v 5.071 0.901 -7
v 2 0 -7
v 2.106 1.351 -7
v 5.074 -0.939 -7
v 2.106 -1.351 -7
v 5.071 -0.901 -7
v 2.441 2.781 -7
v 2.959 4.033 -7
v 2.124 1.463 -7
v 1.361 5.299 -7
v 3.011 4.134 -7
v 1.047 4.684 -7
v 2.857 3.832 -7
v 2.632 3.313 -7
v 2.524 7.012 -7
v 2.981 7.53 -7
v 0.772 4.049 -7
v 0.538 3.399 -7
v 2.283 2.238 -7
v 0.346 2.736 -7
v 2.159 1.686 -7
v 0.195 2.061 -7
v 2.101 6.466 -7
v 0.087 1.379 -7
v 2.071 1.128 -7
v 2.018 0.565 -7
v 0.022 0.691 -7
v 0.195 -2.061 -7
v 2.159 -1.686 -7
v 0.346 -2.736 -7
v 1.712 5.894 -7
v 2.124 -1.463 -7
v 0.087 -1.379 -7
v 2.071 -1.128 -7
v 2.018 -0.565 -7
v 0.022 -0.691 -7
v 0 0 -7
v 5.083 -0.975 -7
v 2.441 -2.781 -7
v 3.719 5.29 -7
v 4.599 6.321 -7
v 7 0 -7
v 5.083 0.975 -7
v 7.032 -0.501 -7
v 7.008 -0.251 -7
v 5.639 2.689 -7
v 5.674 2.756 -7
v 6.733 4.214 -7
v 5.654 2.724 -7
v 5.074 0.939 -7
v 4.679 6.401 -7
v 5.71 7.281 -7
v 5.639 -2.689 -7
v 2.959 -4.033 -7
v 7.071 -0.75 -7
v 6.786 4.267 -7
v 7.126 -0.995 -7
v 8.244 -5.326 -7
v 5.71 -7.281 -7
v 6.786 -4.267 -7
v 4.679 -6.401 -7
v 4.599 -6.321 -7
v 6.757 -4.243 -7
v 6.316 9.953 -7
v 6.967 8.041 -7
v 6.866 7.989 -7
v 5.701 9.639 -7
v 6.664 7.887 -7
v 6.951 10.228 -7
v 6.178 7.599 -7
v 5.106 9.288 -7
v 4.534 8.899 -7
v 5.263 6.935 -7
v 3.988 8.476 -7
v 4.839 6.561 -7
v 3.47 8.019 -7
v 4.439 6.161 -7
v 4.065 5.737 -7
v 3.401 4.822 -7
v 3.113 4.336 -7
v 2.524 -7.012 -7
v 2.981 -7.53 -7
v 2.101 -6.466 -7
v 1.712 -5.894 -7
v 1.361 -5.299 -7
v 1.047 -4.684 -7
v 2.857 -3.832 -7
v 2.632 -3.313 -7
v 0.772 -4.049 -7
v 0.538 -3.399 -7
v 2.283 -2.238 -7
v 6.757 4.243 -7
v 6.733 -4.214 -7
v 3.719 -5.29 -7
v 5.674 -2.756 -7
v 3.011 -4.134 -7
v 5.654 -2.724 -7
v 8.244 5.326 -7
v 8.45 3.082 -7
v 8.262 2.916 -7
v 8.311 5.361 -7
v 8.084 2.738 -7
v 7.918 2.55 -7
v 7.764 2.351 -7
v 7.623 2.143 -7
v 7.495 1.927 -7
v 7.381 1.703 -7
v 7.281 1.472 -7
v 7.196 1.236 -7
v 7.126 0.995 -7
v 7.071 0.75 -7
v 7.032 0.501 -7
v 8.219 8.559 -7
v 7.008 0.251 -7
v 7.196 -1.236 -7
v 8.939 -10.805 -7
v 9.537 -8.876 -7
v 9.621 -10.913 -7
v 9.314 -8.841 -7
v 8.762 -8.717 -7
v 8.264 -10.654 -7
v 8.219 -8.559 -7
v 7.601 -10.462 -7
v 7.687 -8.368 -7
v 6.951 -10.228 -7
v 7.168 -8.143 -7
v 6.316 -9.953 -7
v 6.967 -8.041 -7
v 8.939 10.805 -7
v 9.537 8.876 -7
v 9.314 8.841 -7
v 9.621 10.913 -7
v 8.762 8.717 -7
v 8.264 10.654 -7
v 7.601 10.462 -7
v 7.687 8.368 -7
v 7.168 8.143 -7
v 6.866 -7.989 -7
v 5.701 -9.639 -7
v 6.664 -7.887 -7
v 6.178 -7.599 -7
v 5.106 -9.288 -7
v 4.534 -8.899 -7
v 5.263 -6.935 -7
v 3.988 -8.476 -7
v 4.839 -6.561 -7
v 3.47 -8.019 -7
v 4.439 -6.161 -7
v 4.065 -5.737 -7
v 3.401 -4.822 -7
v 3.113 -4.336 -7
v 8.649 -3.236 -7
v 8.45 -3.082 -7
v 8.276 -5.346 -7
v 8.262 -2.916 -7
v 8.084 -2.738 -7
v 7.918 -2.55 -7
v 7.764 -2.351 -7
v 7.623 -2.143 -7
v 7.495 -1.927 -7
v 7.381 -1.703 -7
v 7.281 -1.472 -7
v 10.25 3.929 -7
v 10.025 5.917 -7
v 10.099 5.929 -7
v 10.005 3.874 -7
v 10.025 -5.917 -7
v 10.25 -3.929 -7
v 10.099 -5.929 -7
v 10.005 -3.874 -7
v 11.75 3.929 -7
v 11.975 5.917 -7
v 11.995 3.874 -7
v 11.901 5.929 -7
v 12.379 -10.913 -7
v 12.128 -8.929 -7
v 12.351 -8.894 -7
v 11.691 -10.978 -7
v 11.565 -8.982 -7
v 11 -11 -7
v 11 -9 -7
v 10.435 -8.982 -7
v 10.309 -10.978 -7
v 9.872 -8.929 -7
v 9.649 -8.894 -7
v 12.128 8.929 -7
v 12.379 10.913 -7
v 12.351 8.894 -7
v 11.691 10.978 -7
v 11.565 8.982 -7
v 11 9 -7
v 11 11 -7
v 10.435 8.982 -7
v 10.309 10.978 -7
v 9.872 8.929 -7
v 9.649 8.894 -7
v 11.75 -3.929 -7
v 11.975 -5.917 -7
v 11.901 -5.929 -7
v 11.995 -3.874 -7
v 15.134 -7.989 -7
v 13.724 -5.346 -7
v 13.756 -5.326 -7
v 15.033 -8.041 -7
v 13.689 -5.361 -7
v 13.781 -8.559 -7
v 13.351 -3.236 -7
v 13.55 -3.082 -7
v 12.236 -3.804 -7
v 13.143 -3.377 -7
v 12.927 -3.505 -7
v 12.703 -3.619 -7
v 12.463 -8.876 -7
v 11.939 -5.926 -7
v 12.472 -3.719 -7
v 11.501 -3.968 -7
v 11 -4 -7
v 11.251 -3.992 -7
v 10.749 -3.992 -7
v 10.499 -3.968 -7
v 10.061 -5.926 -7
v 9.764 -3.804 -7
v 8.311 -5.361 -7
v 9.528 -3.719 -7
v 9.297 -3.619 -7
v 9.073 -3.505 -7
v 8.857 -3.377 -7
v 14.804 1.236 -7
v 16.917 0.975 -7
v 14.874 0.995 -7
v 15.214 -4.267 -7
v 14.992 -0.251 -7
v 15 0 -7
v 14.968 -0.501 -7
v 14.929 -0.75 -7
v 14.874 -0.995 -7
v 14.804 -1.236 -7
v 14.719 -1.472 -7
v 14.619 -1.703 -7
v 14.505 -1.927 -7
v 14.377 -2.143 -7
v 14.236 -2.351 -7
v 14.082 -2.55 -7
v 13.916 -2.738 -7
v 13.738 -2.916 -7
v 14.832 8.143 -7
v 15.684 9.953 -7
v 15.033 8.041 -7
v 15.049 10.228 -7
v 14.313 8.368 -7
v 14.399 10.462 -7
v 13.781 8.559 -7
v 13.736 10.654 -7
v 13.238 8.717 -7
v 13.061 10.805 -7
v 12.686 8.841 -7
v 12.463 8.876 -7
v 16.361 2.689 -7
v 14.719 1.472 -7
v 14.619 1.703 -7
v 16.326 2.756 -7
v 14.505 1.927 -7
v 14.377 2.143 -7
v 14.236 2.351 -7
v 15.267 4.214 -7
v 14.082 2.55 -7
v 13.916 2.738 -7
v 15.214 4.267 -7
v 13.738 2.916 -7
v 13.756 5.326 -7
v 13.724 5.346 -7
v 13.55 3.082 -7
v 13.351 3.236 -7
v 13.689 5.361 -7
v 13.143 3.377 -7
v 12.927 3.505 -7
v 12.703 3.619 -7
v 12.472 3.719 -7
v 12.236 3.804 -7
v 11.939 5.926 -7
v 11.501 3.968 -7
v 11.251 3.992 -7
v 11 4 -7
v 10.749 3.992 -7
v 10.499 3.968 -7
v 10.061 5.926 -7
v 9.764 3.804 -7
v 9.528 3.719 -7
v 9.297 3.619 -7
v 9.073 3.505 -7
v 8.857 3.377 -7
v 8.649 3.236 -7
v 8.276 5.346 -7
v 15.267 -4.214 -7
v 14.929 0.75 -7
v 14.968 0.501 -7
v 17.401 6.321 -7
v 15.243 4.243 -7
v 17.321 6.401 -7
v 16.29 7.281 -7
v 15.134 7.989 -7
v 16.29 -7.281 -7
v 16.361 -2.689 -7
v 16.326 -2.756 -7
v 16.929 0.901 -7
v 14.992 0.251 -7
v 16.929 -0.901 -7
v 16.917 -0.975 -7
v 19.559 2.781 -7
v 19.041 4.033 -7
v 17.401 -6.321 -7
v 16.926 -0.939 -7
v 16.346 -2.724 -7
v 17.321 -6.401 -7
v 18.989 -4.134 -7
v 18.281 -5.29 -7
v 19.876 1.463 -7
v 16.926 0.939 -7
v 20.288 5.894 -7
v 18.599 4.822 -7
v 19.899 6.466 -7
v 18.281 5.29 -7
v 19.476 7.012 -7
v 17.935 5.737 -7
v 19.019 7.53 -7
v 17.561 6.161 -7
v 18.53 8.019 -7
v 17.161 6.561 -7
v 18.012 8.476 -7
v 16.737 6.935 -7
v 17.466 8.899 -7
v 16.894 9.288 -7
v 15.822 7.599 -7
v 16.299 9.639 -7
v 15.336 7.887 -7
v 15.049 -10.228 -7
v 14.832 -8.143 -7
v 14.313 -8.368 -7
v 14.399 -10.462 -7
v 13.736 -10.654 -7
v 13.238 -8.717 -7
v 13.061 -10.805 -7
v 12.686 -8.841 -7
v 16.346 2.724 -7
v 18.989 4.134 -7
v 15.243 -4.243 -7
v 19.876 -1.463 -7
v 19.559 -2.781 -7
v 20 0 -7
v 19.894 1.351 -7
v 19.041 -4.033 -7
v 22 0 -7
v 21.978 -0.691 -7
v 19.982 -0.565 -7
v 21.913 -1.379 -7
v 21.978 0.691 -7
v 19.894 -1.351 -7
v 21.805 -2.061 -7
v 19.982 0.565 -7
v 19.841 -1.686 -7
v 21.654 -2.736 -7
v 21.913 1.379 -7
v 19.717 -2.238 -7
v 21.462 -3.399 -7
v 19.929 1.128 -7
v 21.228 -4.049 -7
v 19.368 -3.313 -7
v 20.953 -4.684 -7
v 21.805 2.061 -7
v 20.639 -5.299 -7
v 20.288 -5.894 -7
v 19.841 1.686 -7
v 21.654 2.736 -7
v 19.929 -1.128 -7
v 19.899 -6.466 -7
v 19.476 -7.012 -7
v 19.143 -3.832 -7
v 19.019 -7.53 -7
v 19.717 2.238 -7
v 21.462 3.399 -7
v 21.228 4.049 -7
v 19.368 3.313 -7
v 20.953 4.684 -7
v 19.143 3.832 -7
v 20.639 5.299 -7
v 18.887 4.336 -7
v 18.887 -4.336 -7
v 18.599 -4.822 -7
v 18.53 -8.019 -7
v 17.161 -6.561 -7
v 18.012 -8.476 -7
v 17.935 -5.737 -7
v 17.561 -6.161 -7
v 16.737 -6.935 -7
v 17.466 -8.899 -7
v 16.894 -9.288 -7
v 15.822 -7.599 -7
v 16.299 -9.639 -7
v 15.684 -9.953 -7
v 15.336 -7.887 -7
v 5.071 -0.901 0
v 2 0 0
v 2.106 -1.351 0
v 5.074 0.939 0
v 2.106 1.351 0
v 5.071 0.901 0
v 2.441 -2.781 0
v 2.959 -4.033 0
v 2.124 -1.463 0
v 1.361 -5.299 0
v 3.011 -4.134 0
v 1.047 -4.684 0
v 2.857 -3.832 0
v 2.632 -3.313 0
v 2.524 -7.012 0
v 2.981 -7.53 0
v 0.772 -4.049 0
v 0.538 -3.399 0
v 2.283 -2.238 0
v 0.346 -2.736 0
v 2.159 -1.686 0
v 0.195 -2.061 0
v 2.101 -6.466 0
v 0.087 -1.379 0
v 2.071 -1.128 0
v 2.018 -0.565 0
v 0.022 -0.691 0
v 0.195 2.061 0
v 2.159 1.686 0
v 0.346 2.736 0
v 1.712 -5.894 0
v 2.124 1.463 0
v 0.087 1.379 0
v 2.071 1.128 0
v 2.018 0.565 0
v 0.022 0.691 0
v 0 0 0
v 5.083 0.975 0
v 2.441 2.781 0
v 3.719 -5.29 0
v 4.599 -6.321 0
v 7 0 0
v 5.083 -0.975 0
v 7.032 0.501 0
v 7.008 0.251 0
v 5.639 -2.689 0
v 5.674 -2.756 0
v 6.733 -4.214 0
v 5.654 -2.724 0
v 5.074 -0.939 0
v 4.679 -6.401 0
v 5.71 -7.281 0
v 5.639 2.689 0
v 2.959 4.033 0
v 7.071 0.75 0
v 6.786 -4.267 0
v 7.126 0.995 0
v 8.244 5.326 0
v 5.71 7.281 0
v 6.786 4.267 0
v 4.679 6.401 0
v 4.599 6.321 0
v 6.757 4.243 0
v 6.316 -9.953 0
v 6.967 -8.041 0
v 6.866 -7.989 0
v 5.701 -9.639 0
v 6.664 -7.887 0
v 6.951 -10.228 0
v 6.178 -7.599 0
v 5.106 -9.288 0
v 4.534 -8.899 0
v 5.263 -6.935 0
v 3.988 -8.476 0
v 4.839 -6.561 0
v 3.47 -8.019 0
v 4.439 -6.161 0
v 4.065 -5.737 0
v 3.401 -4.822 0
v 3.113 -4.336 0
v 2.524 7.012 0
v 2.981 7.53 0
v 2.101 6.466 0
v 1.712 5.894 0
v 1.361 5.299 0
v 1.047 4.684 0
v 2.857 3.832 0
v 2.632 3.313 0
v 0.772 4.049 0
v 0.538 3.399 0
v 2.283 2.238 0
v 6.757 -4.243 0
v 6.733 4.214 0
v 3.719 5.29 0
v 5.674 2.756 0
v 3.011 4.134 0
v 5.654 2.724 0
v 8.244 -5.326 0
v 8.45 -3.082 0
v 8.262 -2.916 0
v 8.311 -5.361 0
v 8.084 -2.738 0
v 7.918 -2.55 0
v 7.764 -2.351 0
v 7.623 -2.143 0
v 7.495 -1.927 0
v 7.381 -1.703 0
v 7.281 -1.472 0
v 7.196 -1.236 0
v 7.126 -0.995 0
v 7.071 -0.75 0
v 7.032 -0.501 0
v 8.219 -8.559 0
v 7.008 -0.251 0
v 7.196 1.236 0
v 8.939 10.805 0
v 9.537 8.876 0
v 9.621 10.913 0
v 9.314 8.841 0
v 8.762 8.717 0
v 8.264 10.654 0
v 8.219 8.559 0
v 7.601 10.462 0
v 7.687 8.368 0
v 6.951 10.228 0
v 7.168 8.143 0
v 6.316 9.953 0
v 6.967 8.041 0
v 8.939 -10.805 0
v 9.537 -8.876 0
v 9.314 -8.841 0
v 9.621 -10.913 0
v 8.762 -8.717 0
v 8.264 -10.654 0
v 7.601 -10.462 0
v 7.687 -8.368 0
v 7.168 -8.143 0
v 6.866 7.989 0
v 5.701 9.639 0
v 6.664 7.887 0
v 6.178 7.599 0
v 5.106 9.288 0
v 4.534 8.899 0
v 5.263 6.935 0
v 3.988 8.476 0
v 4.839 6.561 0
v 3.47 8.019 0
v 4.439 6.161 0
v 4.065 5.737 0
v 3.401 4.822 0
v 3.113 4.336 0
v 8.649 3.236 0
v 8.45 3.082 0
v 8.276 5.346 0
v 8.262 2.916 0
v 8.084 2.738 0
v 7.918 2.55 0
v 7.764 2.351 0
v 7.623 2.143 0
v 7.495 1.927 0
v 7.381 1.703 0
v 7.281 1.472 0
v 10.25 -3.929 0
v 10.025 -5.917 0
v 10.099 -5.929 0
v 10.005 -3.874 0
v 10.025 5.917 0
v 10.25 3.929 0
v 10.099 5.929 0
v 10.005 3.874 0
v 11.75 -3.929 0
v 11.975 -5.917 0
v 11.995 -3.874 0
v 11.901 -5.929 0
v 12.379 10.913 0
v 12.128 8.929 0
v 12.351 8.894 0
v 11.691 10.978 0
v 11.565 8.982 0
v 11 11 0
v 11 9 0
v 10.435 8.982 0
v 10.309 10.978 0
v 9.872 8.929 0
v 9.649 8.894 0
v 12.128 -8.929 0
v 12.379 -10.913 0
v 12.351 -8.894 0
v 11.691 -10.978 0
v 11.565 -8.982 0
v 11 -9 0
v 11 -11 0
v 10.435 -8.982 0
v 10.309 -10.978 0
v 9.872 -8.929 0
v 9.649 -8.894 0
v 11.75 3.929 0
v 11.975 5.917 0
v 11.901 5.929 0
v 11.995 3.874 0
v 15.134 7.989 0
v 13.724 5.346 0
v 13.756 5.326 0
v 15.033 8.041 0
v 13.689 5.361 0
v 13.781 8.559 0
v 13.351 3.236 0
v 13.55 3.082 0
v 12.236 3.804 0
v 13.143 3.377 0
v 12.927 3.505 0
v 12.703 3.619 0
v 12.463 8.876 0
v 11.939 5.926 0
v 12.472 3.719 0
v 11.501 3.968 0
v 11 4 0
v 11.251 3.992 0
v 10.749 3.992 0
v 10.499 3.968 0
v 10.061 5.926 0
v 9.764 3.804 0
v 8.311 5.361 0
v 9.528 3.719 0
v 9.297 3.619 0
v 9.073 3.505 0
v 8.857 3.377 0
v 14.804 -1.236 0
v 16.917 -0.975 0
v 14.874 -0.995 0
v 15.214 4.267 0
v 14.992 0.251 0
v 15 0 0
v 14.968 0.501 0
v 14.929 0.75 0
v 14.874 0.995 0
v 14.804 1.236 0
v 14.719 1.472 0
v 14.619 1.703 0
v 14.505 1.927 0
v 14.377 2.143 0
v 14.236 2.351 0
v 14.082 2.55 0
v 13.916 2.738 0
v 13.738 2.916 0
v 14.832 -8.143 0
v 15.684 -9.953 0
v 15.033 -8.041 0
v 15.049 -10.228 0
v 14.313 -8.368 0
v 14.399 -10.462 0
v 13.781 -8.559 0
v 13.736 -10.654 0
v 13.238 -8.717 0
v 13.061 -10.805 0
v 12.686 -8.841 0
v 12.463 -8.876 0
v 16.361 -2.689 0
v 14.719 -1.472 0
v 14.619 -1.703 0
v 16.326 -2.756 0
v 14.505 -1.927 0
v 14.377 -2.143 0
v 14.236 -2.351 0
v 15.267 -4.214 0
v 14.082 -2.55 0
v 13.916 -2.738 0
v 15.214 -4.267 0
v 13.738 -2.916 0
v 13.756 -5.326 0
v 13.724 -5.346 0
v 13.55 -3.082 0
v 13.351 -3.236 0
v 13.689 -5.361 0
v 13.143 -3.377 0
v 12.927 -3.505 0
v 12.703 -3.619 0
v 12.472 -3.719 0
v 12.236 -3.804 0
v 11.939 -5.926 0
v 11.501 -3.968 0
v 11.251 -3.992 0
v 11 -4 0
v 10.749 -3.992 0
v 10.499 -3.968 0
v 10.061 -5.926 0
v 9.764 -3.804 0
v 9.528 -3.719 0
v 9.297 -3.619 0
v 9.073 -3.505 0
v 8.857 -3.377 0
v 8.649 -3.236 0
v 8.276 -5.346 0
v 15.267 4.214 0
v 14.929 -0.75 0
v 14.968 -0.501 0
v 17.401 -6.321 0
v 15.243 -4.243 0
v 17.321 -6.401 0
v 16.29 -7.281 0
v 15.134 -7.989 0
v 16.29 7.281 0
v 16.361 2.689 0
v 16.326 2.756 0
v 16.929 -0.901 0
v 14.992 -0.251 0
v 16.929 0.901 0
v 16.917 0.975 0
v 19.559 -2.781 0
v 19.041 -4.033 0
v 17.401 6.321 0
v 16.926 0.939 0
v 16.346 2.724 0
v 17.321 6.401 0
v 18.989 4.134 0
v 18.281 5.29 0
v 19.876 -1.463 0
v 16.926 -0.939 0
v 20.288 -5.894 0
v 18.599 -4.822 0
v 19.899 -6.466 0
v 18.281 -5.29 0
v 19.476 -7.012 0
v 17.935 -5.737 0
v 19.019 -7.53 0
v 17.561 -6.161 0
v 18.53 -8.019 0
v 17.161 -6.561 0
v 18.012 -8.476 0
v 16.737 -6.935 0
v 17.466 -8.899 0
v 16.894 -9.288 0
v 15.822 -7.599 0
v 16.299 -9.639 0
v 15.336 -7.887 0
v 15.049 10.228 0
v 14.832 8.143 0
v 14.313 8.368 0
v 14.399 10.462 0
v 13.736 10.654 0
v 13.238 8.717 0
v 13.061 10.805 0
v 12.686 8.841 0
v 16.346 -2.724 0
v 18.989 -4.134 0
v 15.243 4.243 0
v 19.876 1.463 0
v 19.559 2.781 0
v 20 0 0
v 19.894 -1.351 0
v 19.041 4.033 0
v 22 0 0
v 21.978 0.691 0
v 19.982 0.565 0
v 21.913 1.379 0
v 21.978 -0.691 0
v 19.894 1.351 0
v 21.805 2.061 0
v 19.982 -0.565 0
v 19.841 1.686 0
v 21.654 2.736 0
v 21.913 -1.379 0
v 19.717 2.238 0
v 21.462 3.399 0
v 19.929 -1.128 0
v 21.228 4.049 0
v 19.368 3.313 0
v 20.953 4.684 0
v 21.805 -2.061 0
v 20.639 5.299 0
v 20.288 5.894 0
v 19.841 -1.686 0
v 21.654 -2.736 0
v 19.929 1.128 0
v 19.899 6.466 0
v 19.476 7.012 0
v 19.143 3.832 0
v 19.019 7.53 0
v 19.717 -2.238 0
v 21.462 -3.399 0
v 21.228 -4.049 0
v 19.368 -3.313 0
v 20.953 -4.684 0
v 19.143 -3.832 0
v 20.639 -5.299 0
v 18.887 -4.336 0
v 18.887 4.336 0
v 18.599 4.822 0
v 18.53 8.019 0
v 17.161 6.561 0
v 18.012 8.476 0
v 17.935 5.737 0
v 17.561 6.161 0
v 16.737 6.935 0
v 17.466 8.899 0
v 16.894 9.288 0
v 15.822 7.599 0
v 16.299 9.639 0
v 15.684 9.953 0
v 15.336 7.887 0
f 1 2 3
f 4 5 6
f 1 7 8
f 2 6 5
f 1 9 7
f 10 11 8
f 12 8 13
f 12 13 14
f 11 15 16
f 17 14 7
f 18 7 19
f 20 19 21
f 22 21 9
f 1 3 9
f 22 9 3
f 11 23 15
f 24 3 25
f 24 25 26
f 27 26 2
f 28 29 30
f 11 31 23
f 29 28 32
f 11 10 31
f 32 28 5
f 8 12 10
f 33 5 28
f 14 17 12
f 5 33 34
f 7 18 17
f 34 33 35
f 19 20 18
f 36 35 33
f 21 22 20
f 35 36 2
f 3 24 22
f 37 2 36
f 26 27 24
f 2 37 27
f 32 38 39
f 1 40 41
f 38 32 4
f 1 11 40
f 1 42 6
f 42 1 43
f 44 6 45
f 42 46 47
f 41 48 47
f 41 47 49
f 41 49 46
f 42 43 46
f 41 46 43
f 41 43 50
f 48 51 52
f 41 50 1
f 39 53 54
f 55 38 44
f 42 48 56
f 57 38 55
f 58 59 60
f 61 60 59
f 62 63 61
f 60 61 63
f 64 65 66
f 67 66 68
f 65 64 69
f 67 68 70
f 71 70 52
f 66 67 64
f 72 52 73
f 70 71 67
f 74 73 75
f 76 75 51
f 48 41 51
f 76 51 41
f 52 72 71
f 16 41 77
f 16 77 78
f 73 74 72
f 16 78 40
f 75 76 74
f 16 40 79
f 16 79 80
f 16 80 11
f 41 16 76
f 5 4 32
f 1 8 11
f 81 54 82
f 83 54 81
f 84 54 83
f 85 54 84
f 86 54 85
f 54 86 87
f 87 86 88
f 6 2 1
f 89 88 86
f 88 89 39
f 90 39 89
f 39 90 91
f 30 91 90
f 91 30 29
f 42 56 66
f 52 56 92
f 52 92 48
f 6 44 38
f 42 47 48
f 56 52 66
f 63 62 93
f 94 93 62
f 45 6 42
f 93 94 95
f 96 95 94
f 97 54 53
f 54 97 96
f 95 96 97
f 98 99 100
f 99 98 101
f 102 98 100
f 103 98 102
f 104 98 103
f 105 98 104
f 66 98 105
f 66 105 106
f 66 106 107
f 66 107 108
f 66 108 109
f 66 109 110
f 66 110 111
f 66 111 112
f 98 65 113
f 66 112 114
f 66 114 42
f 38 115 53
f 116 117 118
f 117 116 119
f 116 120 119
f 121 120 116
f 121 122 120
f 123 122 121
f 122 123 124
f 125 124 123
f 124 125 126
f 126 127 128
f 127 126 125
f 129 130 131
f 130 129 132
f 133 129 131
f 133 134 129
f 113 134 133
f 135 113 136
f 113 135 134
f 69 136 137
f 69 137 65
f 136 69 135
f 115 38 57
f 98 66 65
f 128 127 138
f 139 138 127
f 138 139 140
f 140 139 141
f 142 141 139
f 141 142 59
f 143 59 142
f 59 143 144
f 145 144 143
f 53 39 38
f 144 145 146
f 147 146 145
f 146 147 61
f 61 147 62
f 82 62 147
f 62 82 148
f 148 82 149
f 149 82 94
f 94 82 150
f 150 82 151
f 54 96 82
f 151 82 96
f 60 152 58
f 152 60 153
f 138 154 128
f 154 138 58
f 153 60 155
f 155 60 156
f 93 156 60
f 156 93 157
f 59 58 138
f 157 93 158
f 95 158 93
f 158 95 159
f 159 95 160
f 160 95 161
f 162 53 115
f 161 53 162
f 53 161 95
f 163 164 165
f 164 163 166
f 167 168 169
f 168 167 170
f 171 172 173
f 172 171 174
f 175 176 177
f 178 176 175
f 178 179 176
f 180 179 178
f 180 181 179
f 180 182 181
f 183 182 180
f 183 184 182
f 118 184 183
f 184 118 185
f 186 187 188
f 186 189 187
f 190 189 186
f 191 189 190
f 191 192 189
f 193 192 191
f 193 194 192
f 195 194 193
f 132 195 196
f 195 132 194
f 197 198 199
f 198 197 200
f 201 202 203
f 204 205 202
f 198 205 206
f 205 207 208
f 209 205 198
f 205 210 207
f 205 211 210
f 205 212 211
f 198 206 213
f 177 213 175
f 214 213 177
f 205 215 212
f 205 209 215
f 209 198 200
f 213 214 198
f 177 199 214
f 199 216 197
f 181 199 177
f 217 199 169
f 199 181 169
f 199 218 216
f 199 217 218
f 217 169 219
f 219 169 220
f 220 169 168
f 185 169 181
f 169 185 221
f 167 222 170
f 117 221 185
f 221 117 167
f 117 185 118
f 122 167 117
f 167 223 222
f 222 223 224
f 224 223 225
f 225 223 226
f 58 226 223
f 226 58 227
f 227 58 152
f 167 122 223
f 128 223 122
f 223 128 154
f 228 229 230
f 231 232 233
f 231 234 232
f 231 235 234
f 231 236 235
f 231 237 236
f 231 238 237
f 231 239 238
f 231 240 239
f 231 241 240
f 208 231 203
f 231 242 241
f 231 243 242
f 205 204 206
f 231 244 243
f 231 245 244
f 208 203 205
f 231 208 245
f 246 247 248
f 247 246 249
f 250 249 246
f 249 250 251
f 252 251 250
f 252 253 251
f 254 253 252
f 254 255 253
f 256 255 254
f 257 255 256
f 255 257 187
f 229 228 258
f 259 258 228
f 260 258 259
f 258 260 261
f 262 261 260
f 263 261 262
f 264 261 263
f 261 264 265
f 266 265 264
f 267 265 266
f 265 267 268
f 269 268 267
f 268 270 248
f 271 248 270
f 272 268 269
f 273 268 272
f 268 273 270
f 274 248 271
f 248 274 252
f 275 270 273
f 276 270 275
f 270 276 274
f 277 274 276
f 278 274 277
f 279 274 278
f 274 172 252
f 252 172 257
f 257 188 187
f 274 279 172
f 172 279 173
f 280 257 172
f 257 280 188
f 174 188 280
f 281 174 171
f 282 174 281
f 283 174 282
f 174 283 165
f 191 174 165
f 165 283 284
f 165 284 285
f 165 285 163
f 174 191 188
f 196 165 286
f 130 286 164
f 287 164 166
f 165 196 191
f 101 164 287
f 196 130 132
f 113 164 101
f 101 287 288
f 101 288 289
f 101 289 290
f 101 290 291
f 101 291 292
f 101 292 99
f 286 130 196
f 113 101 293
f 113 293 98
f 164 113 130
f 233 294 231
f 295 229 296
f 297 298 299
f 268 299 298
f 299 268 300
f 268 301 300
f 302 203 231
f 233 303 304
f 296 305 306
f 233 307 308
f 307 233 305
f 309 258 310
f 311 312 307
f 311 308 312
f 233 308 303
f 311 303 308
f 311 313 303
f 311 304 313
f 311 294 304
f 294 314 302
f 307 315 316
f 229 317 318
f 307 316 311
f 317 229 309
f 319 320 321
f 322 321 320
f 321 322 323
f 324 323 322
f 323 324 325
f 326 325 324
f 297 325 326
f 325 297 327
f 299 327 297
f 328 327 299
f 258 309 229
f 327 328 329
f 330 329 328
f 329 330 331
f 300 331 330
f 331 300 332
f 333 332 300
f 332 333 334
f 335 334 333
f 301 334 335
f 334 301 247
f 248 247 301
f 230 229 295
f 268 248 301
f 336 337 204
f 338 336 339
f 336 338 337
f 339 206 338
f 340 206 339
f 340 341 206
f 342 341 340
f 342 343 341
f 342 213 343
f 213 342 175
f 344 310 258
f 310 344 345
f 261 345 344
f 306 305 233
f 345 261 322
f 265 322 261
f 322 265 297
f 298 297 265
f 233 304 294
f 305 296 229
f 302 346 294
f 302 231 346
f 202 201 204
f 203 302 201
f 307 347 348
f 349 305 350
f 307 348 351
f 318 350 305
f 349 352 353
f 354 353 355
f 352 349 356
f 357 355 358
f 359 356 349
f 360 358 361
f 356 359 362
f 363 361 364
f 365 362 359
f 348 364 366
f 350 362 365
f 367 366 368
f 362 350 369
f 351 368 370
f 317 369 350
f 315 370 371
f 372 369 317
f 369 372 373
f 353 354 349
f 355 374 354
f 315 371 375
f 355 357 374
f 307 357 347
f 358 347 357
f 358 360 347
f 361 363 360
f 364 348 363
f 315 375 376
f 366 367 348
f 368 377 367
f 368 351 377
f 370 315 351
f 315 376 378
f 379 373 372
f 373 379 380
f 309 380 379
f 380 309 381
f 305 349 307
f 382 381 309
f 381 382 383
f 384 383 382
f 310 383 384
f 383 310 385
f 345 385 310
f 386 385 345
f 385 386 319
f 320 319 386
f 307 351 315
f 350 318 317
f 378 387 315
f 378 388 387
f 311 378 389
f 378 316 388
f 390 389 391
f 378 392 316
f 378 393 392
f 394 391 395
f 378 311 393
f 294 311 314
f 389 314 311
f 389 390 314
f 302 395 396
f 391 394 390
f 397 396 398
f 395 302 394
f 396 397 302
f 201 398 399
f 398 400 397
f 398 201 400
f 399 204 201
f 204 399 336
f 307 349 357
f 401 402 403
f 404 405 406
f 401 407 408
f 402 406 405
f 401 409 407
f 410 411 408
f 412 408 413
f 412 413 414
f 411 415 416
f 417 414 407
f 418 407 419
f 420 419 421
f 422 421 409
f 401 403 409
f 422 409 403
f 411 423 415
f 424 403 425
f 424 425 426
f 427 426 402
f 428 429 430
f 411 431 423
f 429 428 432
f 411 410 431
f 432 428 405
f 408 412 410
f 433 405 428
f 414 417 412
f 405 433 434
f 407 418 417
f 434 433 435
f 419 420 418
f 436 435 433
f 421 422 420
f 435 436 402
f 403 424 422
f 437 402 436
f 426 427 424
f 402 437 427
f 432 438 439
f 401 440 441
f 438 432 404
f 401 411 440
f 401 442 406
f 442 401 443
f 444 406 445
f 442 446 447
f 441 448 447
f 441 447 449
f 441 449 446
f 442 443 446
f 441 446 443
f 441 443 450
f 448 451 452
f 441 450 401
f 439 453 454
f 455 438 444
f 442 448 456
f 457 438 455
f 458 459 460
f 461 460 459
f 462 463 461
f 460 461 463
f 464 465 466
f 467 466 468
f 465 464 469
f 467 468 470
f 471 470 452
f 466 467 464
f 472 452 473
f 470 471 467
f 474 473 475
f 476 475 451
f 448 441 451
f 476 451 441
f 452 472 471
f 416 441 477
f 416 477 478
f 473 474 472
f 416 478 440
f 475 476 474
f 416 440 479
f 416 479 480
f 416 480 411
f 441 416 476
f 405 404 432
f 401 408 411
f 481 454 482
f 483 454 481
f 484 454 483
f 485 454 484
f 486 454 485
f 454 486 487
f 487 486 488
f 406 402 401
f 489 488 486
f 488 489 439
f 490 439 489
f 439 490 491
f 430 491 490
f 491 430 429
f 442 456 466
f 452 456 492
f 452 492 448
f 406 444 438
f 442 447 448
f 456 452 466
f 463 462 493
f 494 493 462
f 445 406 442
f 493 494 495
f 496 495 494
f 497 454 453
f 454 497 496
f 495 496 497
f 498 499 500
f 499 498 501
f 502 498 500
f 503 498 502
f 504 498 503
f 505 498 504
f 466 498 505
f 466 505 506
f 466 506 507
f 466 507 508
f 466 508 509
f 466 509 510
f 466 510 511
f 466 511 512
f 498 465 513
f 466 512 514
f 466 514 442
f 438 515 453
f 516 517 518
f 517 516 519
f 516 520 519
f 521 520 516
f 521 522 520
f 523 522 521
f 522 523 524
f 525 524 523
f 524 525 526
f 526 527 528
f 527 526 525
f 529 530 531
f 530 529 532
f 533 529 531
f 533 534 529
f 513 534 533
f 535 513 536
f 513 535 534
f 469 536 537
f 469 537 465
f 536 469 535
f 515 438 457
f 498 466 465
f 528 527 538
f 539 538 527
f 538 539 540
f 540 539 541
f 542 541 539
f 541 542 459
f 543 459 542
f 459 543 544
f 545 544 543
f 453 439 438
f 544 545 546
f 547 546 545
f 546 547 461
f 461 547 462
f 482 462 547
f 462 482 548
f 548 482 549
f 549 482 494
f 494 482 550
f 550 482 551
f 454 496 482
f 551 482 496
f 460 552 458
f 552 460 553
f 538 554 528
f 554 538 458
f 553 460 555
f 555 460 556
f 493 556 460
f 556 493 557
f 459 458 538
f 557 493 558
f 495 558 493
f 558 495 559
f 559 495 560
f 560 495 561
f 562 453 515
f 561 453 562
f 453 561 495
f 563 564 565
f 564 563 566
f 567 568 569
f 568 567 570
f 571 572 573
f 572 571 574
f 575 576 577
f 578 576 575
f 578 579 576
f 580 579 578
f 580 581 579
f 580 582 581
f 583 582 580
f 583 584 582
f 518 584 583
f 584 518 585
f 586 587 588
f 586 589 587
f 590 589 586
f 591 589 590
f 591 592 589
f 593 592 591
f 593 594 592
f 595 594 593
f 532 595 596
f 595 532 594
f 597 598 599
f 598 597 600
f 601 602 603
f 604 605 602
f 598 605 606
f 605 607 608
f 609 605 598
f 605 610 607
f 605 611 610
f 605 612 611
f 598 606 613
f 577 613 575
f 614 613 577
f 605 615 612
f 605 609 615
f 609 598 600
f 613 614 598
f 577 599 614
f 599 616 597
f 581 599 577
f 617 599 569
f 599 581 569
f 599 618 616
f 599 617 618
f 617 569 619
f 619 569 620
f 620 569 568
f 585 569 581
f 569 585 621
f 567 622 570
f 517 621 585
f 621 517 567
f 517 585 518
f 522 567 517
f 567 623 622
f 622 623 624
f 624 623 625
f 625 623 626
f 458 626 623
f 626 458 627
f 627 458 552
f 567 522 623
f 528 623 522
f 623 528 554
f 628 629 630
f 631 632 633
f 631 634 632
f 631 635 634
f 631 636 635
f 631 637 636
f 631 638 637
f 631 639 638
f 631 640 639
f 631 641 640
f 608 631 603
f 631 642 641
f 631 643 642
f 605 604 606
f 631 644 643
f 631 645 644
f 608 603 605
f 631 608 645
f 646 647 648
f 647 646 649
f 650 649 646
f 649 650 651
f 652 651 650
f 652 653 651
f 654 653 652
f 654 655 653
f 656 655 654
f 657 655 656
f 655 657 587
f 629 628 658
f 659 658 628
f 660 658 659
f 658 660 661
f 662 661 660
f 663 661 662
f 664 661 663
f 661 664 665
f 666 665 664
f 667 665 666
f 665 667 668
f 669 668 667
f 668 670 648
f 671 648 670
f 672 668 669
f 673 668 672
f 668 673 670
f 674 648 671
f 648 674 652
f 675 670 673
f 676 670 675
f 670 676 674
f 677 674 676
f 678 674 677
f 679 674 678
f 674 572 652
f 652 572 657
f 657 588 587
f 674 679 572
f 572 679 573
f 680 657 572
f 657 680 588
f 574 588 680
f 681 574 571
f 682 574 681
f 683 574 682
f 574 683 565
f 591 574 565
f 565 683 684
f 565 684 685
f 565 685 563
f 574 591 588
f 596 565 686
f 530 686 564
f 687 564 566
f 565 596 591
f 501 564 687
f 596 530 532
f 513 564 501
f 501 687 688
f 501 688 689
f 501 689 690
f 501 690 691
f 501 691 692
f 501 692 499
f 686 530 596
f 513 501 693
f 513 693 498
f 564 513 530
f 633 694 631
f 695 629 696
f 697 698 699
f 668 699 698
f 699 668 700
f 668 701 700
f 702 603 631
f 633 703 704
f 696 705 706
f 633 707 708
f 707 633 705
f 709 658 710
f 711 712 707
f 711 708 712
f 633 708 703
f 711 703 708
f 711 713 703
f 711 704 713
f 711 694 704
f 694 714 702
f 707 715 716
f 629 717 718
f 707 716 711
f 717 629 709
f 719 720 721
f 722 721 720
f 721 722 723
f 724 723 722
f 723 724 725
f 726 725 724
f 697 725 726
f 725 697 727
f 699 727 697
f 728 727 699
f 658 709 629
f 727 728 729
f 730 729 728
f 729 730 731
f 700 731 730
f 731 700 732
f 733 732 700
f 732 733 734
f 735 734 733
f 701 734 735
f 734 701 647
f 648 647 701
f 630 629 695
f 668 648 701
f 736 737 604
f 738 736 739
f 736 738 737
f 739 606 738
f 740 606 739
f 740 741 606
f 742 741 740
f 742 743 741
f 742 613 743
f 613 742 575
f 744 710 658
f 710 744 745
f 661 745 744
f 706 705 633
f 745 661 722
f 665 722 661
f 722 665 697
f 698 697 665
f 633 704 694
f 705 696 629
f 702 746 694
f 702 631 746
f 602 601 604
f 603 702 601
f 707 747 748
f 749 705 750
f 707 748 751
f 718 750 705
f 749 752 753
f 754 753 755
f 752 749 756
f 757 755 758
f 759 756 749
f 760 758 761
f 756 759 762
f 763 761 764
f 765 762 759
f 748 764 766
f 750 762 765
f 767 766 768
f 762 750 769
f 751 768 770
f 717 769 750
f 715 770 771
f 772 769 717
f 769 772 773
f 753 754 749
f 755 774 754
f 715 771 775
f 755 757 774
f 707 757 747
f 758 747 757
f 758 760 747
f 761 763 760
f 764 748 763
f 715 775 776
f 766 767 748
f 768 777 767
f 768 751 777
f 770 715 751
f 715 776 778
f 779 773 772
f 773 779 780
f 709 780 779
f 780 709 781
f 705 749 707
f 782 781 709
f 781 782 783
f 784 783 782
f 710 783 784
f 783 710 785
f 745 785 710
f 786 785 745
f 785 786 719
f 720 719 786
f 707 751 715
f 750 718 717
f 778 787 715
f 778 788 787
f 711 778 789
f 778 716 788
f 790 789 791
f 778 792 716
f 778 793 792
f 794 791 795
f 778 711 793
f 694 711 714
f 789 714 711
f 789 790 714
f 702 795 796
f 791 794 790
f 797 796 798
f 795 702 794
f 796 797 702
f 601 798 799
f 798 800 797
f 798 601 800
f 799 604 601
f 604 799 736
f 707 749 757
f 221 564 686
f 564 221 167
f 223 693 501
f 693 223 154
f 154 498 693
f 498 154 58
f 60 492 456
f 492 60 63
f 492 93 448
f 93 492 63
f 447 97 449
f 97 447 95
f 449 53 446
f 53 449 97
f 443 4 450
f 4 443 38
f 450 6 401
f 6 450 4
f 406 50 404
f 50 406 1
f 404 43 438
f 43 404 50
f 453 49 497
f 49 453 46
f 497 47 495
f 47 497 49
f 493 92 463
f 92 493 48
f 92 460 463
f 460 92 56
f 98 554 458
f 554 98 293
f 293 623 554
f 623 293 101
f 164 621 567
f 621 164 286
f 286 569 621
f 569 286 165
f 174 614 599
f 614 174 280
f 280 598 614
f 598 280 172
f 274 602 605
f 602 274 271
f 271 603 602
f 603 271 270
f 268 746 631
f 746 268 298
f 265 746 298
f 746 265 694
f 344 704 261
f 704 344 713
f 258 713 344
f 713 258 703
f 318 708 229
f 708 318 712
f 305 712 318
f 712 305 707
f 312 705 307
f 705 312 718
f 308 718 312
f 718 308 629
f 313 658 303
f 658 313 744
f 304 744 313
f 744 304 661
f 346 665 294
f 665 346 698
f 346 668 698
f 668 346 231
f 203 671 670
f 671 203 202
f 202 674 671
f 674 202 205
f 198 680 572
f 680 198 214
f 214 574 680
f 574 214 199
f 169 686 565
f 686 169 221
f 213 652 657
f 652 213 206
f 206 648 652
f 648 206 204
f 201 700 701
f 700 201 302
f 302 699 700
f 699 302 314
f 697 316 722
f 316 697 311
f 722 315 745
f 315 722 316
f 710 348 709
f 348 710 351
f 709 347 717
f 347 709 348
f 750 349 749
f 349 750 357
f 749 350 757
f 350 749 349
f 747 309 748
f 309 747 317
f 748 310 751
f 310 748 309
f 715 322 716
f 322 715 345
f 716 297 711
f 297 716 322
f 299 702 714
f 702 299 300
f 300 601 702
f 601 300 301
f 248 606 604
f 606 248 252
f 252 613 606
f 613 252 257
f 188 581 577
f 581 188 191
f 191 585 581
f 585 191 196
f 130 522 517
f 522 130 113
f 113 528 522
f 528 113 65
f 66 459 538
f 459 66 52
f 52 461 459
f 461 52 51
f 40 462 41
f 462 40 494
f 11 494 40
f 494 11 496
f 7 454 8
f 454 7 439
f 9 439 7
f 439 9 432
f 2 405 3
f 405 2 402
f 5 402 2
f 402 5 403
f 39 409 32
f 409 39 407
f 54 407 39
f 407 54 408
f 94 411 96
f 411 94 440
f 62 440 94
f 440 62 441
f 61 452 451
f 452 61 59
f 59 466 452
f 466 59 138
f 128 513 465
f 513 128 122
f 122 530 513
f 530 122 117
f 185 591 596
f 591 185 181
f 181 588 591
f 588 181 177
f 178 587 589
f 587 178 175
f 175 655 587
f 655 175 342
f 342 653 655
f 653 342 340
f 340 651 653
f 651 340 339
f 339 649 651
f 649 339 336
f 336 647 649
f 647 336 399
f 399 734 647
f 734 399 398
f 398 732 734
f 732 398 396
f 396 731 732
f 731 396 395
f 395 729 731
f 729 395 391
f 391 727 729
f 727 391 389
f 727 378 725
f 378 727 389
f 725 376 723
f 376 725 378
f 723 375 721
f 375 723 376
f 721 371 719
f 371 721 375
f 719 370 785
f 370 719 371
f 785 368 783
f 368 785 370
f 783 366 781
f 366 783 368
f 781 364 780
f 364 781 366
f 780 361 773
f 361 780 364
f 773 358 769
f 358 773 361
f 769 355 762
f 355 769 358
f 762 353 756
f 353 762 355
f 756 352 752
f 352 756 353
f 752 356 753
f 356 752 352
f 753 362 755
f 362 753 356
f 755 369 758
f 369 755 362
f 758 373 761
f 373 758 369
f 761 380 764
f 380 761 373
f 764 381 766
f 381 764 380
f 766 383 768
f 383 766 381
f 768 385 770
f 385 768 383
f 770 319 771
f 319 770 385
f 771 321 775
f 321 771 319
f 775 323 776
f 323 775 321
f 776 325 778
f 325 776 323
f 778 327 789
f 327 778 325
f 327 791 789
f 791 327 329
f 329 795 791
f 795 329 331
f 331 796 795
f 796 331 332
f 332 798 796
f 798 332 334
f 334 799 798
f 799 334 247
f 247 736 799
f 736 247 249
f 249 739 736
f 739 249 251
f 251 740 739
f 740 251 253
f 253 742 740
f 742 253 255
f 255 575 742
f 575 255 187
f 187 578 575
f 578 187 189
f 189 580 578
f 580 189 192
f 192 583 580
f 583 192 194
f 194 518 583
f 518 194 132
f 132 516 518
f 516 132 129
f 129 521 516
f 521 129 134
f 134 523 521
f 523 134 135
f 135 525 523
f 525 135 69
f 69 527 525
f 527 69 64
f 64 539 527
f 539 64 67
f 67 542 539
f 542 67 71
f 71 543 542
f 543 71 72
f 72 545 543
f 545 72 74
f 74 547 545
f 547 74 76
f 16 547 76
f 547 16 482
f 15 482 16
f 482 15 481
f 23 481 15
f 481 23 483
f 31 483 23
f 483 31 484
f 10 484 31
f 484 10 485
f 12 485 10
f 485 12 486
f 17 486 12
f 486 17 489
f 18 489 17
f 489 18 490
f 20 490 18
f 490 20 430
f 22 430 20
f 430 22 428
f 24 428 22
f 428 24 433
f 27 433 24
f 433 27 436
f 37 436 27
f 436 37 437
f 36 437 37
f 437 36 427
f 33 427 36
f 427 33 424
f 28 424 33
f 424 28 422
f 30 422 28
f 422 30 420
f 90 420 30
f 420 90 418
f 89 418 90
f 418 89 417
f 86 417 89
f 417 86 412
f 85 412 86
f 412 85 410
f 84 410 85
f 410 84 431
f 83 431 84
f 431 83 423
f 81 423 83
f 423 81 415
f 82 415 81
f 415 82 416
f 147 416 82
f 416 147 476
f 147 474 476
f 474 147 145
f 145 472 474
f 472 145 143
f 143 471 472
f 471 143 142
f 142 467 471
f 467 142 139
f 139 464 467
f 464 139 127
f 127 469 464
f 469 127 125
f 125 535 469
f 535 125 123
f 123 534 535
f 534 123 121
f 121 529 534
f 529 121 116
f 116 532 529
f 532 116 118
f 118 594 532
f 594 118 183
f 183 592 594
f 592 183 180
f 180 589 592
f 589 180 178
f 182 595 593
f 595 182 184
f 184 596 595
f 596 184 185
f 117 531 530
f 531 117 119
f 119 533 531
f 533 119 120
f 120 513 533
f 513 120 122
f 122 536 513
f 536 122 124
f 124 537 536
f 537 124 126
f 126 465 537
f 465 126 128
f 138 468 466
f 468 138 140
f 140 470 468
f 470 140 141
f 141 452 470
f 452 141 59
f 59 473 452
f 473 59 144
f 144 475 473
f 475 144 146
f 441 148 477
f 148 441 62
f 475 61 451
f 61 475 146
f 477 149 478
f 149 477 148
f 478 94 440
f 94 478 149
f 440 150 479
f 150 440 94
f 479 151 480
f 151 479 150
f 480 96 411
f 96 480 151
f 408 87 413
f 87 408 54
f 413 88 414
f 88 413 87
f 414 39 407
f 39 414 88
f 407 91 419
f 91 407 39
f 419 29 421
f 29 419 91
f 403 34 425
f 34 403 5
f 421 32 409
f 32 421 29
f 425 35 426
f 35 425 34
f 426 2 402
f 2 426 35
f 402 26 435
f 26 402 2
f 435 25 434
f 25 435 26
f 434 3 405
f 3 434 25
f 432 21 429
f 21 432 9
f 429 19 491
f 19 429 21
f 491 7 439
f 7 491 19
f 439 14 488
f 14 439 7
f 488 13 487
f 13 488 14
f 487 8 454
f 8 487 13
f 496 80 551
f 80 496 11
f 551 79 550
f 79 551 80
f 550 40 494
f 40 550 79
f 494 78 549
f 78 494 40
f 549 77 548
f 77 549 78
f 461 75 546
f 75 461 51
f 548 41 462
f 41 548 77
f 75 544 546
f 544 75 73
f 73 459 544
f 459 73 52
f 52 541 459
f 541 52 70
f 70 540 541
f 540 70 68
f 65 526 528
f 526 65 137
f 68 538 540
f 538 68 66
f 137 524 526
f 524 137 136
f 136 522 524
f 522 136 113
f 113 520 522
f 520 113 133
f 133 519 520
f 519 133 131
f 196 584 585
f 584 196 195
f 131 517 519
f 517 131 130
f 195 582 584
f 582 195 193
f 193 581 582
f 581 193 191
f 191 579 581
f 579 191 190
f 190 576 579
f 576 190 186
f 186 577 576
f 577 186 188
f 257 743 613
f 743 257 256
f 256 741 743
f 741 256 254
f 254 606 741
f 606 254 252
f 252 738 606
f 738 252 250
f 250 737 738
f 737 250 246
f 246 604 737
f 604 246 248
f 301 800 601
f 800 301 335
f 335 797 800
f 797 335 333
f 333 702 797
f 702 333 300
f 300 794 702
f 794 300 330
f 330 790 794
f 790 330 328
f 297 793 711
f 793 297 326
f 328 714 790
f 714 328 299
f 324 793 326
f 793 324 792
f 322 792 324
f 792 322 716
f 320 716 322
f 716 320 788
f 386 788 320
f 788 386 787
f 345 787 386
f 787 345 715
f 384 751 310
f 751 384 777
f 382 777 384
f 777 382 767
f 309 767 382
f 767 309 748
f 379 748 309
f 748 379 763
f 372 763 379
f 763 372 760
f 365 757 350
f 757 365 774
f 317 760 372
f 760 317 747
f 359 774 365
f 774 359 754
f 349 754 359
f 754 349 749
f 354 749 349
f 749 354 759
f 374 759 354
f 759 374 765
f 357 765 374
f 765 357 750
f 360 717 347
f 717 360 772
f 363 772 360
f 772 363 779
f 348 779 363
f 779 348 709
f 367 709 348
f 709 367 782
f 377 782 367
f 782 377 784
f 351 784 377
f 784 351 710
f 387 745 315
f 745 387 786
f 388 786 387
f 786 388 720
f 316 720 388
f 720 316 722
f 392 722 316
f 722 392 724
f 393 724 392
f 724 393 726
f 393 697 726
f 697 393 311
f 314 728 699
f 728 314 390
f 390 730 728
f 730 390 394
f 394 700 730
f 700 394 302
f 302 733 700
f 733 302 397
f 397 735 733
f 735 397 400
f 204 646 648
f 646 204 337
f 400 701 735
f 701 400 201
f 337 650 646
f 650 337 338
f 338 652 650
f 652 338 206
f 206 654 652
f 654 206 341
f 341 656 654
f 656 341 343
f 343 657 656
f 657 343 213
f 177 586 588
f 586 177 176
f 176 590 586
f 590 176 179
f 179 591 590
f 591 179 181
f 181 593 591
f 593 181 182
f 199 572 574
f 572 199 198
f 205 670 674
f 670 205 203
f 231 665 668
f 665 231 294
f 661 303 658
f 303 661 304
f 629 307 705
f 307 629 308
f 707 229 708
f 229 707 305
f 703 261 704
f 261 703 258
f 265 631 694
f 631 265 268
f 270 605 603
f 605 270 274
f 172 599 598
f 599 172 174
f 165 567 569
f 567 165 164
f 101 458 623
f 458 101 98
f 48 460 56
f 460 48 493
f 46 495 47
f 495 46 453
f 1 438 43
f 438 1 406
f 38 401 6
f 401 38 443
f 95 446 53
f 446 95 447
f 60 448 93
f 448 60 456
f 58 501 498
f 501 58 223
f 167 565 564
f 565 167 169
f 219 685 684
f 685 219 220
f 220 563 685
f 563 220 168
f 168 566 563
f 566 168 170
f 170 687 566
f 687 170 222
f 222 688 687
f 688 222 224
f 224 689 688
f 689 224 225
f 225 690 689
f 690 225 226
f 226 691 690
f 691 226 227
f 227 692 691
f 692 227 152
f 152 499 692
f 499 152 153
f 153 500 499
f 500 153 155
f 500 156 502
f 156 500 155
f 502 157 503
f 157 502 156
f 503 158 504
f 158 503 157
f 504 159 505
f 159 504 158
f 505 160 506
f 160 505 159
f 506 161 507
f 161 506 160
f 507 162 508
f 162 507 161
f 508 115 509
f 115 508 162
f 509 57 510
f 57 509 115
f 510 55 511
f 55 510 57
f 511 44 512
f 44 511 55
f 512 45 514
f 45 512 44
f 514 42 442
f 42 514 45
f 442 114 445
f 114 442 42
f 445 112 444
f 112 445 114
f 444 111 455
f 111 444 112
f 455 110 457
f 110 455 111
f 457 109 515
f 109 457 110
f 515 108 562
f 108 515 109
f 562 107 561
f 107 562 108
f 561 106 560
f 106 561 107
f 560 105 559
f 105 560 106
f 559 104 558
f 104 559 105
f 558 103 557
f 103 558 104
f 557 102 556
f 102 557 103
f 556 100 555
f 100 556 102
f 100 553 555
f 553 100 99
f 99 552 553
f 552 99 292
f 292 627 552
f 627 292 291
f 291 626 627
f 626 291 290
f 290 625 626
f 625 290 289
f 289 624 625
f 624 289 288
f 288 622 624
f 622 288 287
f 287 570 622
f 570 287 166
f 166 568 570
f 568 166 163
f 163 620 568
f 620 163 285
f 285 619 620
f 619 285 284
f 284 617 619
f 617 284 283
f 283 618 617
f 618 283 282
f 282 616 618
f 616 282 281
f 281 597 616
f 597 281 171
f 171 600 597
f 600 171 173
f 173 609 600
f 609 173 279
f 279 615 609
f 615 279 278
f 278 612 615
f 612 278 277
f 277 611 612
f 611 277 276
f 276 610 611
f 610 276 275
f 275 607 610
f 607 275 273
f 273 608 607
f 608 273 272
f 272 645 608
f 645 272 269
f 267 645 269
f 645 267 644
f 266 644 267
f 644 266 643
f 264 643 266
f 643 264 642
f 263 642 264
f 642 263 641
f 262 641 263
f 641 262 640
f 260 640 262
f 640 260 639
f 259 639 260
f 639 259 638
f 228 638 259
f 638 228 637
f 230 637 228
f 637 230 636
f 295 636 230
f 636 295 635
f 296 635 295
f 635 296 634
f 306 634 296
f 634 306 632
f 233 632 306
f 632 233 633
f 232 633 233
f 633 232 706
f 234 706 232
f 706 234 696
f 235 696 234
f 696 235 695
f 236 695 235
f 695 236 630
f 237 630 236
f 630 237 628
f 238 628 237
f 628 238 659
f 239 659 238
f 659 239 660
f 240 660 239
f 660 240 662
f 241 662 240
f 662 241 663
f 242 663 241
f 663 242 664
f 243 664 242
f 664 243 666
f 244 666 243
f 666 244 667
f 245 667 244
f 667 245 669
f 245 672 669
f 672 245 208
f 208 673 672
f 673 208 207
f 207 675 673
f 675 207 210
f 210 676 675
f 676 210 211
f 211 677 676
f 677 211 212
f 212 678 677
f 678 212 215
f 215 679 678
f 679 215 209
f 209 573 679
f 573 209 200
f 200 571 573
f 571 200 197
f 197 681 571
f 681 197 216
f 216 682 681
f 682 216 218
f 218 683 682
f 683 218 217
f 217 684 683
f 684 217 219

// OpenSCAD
/**
 * Module: Bearing (Placeholder / Visual Mock-up)
 *
 * This module provides a non-functional, non-printable visual representation of a ball bearing
 * (e.g. flanged 685-Z bearing) for use in exploded views, assemblies, and animations. It is
 * intended purely as a decorative placeholder to visually indicate bearing placement within
 * mechanical systems such as rack-and-pinion steering setups.
 *
 * NOTE: This model is not dimensionally accurate for mechanical simulation and is NOT
 * meant for 3D printing or physical prototyping.
 *
 *
 * Author: Karim Aziiev <karim.aziiev@gmail.com>
 * License: GPL-3.0-or-later
 */

include <../colors.scad>
include <../parameters.scad>

use <../lib/plist.scad>
use <../lib/shapes2d.scad>
use <../lib/transforms.scad>

bearing_shaft_d        = 8;
bearing_section_height = 7;
outer_ring_w           = 2;
shaft_ring_w           = 2;
outer_bearing_d        = 22;
rings                  = [[2, metallic_yellow_silver],
                          [1, onyx]];

module bearing(rings = [[0]],
               d = outer_bearing_d,
               outer_ring_w = outer_ring_w,
               outer_col = metallic_grey,
               shaft_d = bearing_shaft_d,
               shaft_ring_w = shaft_ring_w,
               shaft_ring_col = metallic_silver_2,
               h = bearing_section_height,
               flanged_h=0,
               flanged_w=0,
               fn=100,
               anchor=[0, 0, 1],
               orientation="wlh") {
  ring_widths = [for (x = rings) x[0]];
  ring_colors = [for (x = rings) x[1]];
  num_rings = len(rings);

  d_first = shaft_d + 2 * shaft_ring_w;

  ring_width_last = ring_widths[num_rings - 1];
  d_last = d - 2 * outer_ring_w - 2 * ring_width_last;

  with_orientation(from="wlh", to=orientation, anchor=anchor, size=[d, d, h]) {
    union() {
      color(outer_col) {
        linear_extrude(height = h) {
          ring_2d(w = outer_ring_w, d = d, outer = false, fn=fn);
        }

        if (flanged_w > 0 && flanged_h > 0) {
          linear_extrude(height = flanged_h) {
            ring_2d(w = flanged_w, d = d, outer = true, fn=fn);
          }
        }
      }

      color(shaft_ring_col) {
        linear_extrude(height = h) {
          ring_2d(w=shaft_ring_w, d=shaft_d, outer = true, fn=fn);
        }
      }

      for (i = [1 : num_rings]) {

        d_ring = (num_rings > 1)
                 ? d_first + (d_last - d_first) * ((i - 1) / (num_rings - 1))
                 : d_first;

        col_ring = ring_colors[i - 1];
        w_ring   = ring_widths[i - 1];

        color(col_ring) {
          linear_extrude(height = h) {
            ring_2d(w = w_ring, d = d_ring, outer = true, fn=40);
          }
        }
      }
    }
  }
}

module bearing_from_plist(plist,
                          fn=100,
                          anchor=[0, 0, 1],
                          orientation="wlh") {
  rings = plist_get("rings", plist, [[0]]);
  d = plist_get("d", plist, outer_bearing_d);
  outer_ring_w = plist_get("outer_ring_w", plist, outer_ring_w);
  outer_col = plist_get("outer_col", plist, metallic_grey);
  shaft_d = plist_get("shaft_d", plist, bearing_shaft_d);
  shaft_ring_w = plist_get("shaft_ring_w", plist, shaft_ring_w);
  shaft_ring_col = plist_get("shaft_ring_col", plist, metallic_silver_2);
  h = plist_get("h", plist, bearing_section_height);
  flanged_h = plist_get("flanged_h", plist, 0);
  flanged_w = plist_get("flanged_w", plist, 0);
  bearing(rings=rings,
          d=d,
          outer_ring_w=outer_ring_w,
          outer_col=outer_col,
          shaft_d=shaft_d,
          shaft_ring_w=shaft_ring_w,
          shaft_ring_col=shaft_ring_col,
          h=h,
          flanged_h=flanged_h,
          flanged_w=flanged_w,
          fn=fn,
          anchor=anchor,
          orientation=orientation);
}

bearing(rings=rings, anchor=[1, 0, -1]);
